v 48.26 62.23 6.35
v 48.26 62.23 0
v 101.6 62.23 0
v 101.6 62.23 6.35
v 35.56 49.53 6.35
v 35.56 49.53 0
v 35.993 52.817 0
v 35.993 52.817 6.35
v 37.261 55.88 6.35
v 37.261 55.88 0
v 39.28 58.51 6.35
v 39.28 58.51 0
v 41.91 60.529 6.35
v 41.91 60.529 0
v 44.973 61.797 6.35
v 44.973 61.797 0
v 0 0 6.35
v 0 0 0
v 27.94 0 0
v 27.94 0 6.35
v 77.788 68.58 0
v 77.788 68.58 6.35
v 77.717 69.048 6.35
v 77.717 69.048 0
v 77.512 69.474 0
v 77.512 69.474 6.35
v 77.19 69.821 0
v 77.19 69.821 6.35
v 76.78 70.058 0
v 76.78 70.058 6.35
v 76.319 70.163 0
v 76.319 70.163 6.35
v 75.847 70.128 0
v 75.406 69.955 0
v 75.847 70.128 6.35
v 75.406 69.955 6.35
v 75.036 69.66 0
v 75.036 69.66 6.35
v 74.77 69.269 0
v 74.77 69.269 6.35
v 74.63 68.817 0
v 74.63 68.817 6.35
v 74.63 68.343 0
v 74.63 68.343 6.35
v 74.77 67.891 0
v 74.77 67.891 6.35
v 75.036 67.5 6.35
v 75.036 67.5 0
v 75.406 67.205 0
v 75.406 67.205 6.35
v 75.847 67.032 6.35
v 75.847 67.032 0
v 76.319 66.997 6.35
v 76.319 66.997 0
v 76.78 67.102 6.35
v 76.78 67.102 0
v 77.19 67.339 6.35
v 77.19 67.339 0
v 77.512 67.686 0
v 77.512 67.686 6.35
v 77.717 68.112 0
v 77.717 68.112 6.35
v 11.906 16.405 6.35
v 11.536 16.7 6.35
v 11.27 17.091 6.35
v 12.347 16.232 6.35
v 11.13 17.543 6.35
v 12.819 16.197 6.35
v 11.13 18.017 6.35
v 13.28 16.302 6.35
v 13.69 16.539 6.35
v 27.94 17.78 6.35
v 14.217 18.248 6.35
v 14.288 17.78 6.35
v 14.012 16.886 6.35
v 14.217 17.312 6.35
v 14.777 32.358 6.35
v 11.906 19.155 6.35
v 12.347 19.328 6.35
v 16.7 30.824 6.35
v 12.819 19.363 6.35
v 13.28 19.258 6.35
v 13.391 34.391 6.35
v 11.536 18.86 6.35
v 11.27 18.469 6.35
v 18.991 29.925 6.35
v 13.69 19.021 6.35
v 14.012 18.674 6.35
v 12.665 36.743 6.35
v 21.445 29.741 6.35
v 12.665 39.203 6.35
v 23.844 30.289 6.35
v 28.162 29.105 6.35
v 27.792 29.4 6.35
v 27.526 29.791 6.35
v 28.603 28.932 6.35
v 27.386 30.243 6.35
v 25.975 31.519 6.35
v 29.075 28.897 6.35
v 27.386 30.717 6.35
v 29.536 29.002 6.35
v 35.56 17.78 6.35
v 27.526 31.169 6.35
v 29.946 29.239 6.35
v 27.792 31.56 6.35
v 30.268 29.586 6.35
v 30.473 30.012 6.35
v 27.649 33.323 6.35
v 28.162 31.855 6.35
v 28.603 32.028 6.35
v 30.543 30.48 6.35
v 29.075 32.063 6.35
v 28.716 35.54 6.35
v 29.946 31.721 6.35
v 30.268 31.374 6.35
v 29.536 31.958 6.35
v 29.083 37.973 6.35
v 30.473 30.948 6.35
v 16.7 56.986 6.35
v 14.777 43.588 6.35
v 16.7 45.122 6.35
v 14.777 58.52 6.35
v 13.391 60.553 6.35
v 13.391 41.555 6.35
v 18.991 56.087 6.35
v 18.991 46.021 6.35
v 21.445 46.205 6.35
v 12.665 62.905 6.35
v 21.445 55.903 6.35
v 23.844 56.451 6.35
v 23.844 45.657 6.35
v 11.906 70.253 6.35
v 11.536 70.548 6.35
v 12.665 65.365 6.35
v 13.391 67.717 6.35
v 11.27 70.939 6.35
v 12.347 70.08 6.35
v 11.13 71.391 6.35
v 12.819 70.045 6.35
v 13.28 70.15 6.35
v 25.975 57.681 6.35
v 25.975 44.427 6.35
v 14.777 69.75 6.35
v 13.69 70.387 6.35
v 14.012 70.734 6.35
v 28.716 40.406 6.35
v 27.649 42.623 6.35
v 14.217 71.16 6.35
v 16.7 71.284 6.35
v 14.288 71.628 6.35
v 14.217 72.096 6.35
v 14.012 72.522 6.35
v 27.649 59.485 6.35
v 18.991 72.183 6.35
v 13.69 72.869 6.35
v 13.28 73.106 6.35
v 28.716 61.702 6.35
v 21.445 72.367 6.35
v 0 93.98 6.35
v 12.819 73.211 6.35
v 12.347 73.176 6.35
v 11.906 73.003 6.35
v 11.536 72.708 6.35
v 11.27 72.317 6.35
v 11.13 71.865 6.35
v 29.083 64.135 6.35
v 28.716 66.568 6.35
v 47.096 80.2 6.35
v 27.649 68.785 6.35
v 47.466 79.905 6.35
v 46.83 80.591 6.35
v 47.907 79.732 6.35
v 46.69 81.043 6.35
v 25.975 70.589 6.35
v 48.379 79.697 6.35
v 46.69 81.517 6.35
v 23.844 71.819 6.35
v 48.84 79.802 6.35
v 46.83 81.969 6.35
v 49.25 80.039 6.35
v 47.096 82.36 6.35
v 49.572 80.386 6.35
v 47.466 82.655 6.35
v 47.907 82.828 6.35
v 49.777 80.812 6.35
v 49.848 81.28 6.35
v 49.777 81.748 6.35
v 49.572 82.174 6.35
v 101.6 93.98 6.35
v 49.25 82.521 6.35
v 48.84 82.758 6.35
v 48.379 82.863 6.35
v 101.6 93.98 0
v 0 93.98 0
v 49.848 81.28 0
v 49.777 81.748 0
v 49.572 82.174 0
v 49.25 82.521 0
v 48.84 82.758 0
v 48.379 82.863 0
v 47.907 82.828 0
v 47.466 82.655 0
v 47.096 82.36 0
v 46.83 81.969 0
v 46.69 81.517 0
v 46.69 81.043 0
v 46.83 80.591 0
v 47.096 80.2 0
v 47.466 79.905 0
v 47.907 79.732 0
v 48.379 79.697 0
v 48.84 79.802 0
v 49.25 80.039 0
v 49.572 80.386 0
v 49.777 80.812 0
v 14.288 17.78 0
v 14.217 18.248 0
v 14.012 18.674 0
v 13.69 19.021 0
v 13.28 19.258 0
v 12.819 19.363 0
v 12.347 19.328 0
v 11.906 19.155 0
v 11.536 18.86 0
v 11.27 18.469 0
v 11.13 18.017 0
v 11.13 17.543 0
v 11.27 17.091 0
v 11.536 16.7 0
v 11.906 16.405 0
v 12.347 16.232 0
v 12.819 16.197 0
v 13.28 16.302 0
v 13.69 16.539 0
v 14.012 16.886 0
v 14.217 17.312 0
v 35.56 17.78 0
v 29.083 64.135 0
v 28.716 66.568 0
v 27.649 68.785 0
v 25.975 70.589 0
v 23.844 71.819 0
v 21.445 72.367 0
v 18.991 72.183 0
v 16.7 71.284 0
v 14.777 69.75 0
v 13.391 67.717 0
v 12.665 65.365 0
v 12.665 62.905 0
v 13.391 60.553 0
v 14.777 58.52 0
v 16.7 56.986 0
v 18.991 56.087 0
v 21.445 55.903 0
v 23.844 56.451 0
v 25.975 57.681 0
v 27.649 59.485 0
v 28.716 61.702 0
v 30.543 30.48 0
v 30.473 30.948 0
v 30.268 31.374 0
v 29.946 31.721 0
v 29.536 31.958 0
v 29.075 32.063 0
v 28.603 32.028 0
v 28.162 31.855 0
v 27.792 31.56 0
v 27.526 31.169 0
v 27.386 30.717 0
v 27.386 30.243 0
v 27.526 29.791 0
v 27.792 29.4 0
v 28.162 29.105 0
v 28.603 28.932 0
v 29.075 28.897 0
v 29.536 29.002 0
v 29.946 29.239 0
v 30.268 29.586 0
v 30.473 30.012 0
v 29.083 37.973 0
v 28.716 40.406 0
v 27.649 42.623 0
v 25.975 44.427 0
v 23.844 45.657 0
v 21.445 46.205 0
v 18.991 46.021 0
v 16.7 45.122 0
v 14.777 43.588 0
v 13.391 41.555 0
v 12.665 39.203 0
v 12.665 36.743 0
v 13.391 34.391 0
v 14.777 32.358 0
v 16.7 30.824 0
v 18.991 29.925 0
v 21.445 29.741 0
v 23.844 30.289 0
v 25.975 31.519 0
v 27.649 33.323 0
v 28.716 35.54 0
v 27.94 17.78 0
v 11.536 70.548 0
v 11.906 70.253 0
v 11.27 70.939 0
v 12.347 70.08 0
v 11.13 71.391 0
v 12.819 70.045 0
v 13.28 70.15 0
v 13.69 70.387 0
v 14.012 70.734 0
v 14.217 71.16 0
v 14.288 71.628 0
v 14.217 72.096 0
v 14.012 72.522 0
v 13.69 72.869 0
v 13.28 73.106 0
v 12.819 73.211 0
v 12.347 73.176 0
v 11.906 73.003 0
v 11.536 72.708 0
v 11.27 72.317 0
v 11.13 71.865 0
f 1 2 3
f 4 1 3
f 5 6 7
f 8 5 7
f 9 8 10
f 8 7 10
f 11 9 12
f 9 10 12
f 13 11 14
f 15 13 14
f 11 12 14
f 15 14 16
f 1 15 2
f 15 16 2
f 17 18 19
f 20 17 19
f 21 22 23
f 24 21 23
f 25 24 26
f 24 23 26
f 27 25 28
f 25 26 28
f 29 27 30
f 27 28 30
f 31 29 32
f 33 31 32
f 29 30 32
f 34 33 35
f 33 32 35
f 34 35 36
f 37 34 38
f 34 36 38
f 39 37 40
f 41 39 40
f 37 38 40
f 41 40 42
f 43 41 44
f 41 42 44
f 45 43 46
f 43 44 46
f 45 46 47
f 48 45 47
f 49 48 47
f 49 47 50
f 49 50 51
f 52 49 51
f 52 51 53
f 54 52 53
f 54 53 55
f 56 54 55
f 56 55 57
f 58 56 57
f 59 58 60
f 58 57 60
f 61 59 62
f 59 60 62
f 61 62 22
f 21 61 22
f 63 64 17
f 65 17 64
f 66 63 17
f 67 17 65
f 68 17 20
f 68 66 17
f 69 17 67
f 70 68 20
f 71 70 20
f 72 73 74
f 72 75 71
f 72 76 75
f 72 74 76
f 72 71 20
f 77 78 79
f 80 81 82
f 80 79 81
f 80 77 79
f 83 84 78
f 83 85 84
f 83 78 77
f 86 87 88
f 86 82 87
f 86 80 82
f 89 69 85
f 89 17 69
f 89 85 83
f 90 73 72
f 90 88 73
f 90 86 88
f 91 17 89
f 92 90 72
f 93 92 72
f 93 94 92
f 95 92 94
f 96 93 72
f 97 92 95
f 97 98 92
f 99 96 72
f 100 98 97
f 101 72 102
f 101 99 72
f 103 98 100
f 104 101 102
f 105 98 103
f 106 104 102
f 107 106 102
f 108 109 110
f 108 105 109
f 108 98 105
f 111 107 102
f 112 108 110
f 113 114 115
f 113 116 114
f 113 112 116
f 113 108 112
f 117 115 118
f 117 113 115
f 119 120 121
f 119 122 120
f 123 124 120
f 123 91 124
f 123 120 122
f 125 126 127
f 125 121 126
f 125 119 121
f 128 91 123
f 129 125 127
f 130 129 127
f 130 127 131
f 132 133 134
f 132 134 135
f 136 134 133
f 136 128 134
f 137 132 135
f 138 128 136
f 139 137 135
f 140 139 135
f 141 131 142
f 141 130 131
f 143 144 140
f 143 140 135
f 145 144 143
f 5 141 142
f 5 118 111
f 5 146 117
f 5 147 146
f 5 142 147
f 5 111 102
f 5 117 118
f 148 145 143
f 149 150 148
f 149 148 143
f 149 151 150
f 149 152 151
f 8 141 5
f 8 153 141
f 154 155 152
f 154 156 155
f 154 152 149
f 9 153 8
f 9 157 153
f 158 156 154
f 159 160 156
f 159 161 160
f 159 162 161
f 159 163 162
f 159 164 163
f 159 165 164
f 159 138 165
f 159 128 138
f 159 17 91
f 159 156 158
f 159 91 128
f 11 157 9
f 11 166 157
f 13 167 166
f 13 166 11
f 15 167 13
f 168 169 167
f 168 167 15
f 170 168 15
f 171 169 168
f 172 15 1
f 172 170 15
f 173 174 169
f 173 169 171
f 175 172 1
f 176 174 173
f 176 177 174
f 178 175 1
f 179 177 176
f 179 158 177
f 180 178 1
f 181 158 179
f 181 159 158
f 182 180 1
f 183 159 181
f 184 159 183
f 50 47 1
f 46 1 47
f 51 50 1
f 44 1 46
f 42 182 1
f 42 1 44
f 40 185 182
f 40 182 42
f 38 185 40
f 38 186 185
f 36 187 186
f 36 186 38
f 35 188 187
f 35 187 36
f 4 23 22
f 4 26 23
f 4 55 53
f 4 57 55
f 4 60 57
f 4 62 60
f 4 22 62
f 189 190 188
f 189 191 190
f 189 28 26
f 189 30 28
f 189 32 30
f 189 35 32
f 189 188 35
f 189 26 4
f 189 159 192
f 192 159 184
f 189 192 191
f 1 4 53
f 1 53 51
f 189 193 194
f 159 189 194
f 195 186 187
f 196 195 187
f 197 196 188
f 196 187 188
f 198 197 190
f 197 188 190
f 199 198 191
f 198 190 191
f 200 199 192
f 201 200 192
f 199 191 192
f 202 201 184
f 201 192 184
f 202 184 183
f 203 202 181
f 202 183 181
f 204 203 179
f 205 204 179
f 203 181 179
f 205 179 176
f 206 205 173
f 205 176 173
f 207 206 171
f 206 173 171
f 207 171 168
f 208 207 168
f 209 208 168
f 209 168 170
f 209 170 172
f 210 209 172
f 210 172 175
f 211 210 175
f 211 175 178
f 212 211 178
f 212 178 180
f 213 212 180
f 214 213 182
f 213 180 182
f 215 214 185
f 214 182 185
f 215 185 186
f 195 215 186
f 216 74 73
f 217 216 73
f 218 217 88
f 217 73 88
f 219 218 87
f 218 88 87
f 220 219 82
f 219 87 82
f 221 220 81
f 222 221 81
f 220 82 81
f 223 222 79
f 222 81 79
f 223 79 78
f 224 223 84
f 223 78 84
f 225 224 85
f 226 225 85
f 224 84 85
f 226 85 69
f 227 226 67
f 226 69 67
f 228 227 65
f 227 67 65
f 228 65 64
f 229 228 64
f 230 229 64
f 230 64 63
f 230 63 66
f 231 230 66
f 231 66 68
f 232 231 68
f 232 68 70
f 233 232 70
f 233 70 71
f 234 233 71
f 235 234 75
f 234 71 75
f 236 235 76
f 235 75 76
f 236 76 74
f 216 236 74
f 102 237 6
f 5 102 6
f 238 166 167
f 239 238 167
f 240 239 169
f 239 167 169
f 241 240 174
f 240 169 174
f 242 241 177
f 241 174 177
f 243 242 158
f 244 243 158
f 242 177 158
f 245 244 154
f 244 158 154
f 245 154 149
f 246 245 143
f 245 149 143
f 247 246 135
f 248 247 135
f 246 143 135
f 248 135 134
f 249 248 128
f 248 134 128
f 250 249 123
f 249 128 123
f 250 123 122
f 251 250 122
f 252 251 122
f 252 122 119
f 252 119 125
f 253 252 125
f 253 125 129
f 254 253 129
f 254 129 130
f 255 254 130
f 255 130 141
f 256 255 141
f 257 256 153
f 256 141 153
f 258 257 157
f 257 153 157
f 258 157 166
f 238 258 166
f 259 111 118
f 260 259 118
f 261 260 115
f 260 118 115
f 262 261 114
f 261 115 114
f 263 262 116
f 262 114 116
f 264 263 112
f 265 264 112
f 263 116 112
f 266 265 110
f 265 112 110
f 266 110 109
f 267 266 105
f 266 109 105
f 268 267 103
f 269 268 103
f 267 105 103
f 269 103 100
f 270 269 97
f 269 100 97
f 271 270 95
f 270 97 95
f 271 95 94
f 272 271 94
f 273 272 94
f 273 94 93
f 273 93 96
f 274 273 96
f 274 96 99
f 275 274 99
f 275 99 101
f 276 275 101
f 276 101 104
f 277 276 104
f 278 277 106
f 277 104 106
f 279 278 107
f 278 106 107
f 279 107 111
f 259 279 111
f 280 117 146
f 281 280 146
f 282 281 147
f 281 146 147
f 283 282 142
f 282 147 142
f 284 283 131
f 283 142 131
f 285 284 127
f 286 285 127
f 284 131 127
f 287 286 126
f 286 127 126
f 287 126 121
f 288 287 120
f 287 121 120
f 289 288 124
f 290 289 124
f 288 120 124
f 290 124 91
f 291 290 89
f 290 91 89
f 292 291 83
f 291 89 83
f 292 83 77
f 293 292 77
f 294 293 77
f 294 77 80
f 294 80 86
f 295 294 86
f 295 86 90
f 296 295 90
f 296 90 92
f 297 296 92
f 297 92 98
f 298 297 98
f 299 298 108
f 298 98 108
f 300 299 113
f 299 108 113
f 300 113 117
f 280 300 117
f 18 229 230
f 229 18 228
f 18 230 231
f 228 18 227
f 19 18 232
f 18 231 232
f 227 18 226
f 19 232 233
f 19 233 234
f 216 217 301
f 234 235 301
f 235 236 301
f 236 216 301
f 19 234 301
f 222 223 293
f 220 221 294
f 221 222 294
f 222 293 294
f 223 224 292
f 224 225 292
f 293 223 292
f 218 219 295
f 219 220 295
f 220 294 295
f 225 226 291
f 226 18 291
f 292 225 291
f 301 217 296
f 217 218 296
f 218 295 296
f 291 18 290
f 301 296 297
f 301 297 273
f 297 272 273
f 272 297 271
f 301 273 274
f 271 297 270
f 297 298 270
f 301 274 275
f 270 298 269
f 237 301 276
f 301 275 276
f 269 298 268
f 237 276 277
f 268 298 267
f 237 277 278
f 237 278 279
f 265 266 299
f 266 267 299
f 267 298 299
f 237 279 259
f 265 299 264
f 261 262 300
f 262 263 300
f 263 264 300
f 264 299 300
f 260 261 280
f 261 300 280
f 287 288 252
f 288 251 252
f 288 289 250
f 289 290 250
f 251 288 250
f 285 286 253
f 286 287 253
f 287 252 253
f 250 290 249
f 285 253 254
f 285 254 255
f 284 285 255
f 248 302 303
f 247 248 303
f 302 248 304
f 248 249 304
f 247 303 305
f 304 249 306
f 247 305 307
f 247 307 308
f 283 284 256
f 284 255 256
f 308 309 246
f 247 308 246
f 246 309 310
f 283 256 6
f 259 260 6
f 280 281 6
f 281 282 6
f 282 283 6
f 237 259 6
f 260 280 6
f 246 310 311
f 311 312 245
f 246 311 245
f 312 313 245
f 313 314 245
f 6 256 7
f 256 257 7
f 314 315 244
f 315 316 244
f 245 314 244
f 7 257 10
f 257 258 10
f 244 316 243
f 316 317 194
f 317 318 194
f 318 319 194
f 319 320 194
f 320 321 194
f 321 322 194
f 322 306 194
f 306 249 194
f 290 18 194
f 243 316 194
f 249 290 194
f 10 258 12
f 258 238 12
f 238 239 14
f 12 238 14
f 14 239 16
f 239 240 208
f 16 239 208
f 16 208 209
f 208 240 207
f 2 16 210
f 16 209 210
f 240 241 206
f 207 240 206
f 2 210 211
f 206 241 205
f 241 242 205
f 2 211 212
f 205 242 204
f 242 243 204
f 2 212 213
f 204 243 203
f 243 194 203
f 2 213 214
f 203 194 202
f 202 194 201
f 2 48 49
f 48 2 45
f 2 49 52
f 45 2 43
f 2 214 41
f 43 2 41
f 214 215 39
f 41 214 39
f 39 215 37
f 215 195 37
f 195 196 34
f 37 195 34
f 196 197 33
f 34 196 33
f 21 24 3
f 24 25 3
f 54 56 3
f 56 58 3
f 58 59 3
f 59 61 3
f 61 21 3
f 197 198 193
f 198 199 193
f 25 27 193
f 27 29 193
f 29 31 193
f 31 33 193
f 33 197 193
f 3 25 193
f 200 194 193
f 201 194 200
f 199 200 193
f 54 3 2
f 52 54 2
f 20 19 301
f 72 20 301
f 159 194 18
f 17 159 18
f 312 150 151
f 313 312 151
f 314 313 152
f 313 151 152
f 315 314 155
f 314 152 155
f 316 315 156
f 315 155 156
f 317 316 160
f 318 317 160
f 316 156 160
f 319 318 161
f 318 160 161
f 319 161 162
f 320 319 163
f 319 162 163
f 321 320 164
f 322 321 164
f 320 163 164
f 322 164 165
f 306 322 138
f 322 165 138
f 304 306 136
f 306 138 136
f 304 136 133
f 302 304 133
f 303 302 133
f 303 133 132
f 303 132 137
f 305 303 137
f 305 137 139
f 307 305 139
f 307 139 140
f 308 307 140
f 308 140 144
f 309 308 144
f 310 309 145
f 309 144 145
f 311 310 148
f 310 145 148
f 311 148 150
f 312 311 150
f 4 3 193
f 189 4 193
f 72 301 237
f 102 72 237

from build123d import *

# Parameters (mm, degrees)
F1_DEPTH = 6.35
F2_R     = 1.5875
F2_R_2   = 8.255
F3_DEPTH = 6.35
F4_W     = 101.6
F4_H     = 93.98
F5_DEPTH = 25.4


with BuildPart() as f1:
    # F0 (on Top) → F1 (new body)
    with BuildSketch(Plane.XY):
        with BuildLine():
            Line((0, 93.98), (0, 0))
            Line((0, 0), (27.94, 0))
            Line((27.94, 0), (27.94, 17.78))
            Line((27.94, 17.78), (35.56, 17.78))
            Line((35.56, 17.78), (35.56, 49.53))
            ThreePointArc((35.56, 49.53), (39.279744, 58.510256), (48.26, 62.23))
            Line((48.26, 62.23), (154.94, 62.23))
            ThreePointArc((154.94, 62.23), (163.920256, 58.510256), (167.64, 49.53))
            Line((167.64, 49.53), (167.64, 17.78))
            Line((167.64, 17.78), (175.26, 17.78))
            Line((175.26, 17.78), (175.26, 0))
            Line((175.26, 0), (203.2, 0))
            Line((203.2, 0), (203.2, 93.98))
            Line((203.2, 93.98), (0, 93.98))
        make_face()
    extrude(amount=F1_DEPTH)

    # F2 (on face) → F3 (cut)
    with BuildSketch(Plane.XY.offset(6.35)):
        with Locations((12.7, 17.78)):
            Circle(F2_R)
        with Locations((28.956, 30.48)):
            Circle(F2_R)
        with Locations((20.828, 37.973)):
            Circle(F2_R_2)
        with Locations((20.828, 64.135)):
            Circle(F2_R_2)
        with Locations((12.7, 71.628)):
            Circle(F2_R)
        with Locations((48.26, 81.28)):
            Circle(F2_R)
        with Locations((76.2, 68.58)):
            Circle(F2_R)
        with Locations((127, 68.58)):
            Circle(F2_R)
        with Locations((154.94, 81.28)):
            Circle(F2_R)
        with Locations((174.244, 71.628)):
            Circle(F2_R)
        with Locations((182.372, 64.135)):
            Circle(F2_R_2)
        with Locations((182.372, 37.973)):
            Circle(F2_R_2)
        with Locations((190.5, 30.48)):
            Circle(F2_R)
        with Locations((190.5, 17.78)):
            Circle(F2_R)
    extrude(amount=-F3_DEPTH, mode=Mode.SUBTRACT)

    # F4 (on Top) → F5 (cut)
    with BuildSketch(Plane.XY):
        with Locations((152.4, 46.99)):
            Rectangle(F4_W, F4_H)
    extrude(amount=F5_DEPTH, mode=Mode.SUBTRACT)


solid = f1.part
